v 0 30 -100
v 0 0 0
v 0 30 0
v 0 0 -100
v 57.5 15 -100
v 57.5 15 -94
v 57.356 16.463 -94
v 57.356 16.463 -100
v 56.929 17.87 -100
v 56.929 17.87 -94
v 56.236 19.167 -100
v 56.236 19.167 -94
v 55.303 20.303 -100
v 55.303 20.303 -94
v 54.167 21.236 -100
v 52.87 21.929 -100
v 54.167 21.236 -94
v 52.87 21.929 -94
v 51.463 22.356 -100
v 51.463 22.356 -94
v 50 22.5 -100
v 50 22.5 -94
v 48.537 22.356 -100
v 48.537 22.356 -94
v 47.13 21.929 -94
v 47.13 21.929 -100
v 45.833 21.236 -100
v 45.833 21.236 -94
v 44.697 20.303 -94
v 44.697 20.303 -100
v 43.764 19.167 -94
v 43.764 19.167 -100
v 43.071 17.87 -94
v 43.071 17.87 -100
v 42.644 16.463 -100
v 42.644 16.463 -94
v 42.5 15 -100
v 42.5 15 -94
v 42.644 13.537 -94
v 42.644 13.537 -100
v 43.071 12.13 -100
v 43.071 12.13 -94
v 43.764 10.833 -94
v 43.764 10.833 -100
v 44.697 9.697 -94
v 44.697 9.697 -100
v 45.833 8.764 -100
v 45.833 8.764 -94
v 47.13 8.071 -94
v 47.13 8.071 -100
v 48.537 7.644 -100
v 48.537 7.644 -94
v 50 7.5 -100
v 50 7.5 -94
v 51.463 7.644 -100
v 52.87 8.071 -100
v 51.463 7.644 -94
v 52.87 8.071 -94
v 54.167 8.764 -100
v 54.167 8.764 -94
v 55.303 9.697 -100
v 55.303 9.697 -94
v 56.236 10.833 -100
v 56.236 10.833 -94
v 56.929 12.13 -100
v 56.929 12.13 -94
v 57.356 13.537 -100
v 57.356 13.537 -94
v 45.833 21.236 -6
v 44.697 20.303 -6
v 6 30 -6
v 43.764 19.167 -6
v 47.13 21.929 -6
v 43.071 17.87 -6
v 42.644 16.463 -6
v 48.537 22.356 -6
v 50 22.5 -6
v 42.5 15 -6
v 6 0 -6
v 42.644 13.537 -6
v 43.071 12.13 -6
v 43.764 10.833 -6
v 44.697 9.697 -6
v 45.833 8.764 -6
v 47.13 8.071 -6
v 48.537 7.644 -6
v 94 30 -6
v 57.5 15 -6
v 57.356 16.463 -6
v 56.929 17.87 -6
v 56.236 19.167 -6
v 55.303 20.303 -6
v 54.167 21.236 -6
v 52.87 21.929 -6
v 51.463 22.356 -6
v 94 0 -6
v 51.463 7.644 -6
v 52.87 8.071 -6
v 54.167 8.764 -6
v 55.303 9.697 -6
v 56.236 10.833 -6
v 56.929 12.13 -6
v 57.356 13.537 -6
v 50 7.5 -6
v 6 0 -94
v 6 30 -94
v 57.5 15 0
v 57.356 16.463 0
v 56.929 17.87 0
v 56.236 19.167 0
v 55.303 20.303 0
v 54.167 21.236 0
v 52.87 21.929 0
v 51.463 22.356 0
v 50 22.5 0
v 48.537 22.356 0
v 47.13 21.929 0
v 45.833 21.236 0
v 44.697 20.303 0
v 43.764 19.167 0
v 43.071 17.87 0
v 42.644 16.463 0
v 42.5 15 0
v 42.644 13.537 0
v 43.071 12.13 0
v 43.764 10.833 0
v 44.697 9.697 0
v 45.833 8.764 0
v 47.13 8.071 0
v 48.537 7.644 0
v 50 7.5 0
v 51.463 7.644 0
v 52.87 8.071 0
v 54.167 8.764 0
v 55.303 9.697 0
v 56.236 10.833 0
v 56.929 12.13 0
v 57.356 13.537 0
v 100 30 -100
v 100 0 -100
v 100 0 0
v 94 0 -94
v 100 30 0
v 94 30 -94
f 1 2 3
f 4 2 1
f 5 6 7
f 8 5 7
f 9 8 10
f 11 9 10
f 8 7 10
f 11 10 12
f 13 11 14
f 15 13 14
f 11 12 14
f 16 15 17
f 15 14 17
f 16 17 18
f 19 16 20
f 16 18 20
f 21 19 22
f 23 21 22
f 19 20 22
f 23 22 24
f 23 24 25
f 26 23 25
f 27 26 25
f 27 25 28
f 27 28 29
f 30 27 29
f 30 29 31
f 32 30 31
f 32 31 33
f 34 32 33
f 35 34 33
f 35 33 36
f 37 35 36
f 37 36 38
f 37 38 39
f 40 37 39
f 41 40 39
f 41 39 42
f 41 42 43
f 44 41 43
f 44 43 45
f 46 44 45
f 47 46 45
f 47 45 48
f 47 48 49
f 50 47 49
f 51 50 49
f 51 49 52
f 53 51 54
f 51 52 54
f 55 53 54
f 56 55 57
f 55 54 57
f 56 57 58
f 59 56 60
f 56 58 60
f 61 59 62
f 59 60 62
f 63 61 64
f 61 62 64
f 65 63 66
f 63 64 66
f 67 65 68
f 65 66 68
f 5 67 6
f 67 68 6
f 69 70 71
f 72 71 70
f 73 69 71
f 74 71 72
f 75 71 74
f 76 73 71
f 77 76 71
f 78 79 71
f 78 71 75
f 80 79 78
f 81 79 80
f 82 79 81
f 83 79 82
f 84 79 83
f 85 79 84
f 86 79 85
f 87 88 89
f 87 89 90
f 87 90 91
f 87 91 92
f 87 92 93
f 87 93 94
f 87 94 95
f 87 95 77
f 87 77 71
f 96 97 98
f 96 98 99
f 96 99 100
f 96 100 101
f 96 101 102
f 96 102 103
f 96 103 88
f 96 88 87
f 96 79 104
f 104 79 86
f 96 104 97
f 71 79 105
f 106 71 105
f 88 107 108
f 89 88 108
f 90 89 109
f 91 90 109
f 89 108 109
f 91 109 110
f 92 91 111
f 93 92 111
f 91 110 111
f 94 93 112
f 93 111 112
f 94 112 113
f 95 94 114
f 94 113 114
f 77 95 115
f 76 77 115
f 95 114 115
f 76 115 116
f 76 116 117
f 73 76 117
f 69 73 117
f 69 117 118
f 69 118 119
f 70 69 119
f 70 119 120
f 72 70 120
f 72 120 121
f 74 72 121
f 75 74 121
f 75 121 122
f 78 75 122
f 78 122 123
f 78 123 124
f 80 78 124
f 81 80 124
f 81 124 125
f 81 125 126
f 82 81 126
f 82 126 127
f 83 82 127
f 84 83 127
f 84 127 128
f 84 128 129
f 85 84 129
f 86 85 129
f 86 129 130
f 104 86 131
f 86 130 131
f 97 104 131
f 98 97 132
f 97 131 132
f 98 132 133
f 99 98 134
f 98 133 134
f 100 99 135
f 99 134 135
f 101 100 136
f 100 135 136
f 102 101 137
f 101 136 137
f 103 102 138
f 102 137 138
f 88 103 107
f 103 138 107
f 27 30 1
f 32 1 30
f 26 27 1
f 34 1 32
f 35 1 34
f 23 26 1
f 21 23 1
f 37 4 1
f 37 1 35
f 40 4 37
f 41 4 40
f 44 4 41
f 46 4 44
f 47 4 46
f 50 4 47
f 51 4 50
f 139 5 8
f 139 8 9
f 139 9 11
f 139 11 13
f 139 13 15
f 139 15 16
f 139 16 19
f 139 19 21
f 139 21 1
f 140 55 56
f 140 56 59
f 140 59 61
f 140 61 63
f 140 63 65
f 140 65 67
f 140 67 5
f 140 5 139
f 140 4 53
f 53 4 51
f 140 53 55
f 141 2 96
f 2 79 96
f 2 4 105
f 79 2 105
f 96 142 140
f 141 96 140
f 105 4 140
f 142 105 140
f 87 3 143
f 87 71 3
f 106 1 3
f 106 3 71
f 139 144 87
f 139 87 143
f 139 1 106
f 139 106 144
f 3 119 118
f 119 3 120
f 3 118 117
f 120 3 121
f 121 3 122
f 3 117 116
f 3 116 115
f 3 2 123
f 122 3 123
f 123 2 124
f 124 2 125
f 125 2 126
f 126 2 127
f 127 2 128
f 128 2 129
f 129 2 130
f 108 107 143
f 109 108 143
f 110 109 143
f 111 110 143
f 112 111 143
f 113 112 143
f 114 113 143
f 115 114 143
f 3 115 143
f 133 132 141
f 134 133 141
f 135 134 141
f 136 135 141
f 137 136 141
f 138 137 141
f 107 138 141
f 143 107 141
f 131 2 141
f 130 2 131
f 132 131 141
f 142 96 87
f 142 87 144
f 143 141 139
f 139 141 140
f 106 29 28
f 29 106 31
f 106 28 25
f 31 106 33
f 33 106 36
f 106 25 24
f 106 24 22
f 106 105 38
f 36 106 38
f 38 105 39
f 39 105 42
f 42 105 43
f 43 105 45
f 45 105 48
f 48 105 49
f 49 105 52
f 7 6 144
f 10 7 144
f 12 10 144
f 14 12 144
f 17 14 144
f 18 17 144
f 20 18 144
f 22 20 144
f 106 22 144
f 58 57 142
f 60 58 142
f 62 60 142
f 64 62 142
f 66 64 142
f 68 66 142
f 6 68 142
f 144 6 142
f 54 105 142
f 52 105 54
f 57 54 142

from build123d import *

# Parameters (mm, degrees)
SKETCH1_W           = 100
SKETCH1_H           = 100
SKETCH1_W_2         = 88
SKETCH1_H_2         = 88
BOSS_EXTRUDE1_DEPTH = 30
SKETCH2_R           = 7.5
CUT_EXTRUDE1_DEPTH  = 145.568322948


with BuildPart() as part:
    # Sketch1 → Boss-Extrude1 (new body)
    with BuildSketch(Plane(origin=(0, 0, 0), x_dir=(1, 0, 0), z_dir=(0, 1, 0))):
        with Locations((50, 50)):
            Rectangle(SKETCH1_W, SKETCH1_H)
        with Locations((50, 50)):
            Rectangle(SKETCH1_W_2, SKETCH1_H_2, mode=Mode.SUBTRACT)
    extrude(amount=BOSS_EXTRUDE1_DEPTH)

    # Sketch2 → Cut-Extrude1 (cut, through all)
    with BuildSketch(Plane.XY):
        with Locations((50, 15)):
            Circle(SKETCH2_R)
    extrude(amount=-CUT_EXTRUDE1_DEPTH, mode=Mode.SUBTRACT)


solid = part.part
